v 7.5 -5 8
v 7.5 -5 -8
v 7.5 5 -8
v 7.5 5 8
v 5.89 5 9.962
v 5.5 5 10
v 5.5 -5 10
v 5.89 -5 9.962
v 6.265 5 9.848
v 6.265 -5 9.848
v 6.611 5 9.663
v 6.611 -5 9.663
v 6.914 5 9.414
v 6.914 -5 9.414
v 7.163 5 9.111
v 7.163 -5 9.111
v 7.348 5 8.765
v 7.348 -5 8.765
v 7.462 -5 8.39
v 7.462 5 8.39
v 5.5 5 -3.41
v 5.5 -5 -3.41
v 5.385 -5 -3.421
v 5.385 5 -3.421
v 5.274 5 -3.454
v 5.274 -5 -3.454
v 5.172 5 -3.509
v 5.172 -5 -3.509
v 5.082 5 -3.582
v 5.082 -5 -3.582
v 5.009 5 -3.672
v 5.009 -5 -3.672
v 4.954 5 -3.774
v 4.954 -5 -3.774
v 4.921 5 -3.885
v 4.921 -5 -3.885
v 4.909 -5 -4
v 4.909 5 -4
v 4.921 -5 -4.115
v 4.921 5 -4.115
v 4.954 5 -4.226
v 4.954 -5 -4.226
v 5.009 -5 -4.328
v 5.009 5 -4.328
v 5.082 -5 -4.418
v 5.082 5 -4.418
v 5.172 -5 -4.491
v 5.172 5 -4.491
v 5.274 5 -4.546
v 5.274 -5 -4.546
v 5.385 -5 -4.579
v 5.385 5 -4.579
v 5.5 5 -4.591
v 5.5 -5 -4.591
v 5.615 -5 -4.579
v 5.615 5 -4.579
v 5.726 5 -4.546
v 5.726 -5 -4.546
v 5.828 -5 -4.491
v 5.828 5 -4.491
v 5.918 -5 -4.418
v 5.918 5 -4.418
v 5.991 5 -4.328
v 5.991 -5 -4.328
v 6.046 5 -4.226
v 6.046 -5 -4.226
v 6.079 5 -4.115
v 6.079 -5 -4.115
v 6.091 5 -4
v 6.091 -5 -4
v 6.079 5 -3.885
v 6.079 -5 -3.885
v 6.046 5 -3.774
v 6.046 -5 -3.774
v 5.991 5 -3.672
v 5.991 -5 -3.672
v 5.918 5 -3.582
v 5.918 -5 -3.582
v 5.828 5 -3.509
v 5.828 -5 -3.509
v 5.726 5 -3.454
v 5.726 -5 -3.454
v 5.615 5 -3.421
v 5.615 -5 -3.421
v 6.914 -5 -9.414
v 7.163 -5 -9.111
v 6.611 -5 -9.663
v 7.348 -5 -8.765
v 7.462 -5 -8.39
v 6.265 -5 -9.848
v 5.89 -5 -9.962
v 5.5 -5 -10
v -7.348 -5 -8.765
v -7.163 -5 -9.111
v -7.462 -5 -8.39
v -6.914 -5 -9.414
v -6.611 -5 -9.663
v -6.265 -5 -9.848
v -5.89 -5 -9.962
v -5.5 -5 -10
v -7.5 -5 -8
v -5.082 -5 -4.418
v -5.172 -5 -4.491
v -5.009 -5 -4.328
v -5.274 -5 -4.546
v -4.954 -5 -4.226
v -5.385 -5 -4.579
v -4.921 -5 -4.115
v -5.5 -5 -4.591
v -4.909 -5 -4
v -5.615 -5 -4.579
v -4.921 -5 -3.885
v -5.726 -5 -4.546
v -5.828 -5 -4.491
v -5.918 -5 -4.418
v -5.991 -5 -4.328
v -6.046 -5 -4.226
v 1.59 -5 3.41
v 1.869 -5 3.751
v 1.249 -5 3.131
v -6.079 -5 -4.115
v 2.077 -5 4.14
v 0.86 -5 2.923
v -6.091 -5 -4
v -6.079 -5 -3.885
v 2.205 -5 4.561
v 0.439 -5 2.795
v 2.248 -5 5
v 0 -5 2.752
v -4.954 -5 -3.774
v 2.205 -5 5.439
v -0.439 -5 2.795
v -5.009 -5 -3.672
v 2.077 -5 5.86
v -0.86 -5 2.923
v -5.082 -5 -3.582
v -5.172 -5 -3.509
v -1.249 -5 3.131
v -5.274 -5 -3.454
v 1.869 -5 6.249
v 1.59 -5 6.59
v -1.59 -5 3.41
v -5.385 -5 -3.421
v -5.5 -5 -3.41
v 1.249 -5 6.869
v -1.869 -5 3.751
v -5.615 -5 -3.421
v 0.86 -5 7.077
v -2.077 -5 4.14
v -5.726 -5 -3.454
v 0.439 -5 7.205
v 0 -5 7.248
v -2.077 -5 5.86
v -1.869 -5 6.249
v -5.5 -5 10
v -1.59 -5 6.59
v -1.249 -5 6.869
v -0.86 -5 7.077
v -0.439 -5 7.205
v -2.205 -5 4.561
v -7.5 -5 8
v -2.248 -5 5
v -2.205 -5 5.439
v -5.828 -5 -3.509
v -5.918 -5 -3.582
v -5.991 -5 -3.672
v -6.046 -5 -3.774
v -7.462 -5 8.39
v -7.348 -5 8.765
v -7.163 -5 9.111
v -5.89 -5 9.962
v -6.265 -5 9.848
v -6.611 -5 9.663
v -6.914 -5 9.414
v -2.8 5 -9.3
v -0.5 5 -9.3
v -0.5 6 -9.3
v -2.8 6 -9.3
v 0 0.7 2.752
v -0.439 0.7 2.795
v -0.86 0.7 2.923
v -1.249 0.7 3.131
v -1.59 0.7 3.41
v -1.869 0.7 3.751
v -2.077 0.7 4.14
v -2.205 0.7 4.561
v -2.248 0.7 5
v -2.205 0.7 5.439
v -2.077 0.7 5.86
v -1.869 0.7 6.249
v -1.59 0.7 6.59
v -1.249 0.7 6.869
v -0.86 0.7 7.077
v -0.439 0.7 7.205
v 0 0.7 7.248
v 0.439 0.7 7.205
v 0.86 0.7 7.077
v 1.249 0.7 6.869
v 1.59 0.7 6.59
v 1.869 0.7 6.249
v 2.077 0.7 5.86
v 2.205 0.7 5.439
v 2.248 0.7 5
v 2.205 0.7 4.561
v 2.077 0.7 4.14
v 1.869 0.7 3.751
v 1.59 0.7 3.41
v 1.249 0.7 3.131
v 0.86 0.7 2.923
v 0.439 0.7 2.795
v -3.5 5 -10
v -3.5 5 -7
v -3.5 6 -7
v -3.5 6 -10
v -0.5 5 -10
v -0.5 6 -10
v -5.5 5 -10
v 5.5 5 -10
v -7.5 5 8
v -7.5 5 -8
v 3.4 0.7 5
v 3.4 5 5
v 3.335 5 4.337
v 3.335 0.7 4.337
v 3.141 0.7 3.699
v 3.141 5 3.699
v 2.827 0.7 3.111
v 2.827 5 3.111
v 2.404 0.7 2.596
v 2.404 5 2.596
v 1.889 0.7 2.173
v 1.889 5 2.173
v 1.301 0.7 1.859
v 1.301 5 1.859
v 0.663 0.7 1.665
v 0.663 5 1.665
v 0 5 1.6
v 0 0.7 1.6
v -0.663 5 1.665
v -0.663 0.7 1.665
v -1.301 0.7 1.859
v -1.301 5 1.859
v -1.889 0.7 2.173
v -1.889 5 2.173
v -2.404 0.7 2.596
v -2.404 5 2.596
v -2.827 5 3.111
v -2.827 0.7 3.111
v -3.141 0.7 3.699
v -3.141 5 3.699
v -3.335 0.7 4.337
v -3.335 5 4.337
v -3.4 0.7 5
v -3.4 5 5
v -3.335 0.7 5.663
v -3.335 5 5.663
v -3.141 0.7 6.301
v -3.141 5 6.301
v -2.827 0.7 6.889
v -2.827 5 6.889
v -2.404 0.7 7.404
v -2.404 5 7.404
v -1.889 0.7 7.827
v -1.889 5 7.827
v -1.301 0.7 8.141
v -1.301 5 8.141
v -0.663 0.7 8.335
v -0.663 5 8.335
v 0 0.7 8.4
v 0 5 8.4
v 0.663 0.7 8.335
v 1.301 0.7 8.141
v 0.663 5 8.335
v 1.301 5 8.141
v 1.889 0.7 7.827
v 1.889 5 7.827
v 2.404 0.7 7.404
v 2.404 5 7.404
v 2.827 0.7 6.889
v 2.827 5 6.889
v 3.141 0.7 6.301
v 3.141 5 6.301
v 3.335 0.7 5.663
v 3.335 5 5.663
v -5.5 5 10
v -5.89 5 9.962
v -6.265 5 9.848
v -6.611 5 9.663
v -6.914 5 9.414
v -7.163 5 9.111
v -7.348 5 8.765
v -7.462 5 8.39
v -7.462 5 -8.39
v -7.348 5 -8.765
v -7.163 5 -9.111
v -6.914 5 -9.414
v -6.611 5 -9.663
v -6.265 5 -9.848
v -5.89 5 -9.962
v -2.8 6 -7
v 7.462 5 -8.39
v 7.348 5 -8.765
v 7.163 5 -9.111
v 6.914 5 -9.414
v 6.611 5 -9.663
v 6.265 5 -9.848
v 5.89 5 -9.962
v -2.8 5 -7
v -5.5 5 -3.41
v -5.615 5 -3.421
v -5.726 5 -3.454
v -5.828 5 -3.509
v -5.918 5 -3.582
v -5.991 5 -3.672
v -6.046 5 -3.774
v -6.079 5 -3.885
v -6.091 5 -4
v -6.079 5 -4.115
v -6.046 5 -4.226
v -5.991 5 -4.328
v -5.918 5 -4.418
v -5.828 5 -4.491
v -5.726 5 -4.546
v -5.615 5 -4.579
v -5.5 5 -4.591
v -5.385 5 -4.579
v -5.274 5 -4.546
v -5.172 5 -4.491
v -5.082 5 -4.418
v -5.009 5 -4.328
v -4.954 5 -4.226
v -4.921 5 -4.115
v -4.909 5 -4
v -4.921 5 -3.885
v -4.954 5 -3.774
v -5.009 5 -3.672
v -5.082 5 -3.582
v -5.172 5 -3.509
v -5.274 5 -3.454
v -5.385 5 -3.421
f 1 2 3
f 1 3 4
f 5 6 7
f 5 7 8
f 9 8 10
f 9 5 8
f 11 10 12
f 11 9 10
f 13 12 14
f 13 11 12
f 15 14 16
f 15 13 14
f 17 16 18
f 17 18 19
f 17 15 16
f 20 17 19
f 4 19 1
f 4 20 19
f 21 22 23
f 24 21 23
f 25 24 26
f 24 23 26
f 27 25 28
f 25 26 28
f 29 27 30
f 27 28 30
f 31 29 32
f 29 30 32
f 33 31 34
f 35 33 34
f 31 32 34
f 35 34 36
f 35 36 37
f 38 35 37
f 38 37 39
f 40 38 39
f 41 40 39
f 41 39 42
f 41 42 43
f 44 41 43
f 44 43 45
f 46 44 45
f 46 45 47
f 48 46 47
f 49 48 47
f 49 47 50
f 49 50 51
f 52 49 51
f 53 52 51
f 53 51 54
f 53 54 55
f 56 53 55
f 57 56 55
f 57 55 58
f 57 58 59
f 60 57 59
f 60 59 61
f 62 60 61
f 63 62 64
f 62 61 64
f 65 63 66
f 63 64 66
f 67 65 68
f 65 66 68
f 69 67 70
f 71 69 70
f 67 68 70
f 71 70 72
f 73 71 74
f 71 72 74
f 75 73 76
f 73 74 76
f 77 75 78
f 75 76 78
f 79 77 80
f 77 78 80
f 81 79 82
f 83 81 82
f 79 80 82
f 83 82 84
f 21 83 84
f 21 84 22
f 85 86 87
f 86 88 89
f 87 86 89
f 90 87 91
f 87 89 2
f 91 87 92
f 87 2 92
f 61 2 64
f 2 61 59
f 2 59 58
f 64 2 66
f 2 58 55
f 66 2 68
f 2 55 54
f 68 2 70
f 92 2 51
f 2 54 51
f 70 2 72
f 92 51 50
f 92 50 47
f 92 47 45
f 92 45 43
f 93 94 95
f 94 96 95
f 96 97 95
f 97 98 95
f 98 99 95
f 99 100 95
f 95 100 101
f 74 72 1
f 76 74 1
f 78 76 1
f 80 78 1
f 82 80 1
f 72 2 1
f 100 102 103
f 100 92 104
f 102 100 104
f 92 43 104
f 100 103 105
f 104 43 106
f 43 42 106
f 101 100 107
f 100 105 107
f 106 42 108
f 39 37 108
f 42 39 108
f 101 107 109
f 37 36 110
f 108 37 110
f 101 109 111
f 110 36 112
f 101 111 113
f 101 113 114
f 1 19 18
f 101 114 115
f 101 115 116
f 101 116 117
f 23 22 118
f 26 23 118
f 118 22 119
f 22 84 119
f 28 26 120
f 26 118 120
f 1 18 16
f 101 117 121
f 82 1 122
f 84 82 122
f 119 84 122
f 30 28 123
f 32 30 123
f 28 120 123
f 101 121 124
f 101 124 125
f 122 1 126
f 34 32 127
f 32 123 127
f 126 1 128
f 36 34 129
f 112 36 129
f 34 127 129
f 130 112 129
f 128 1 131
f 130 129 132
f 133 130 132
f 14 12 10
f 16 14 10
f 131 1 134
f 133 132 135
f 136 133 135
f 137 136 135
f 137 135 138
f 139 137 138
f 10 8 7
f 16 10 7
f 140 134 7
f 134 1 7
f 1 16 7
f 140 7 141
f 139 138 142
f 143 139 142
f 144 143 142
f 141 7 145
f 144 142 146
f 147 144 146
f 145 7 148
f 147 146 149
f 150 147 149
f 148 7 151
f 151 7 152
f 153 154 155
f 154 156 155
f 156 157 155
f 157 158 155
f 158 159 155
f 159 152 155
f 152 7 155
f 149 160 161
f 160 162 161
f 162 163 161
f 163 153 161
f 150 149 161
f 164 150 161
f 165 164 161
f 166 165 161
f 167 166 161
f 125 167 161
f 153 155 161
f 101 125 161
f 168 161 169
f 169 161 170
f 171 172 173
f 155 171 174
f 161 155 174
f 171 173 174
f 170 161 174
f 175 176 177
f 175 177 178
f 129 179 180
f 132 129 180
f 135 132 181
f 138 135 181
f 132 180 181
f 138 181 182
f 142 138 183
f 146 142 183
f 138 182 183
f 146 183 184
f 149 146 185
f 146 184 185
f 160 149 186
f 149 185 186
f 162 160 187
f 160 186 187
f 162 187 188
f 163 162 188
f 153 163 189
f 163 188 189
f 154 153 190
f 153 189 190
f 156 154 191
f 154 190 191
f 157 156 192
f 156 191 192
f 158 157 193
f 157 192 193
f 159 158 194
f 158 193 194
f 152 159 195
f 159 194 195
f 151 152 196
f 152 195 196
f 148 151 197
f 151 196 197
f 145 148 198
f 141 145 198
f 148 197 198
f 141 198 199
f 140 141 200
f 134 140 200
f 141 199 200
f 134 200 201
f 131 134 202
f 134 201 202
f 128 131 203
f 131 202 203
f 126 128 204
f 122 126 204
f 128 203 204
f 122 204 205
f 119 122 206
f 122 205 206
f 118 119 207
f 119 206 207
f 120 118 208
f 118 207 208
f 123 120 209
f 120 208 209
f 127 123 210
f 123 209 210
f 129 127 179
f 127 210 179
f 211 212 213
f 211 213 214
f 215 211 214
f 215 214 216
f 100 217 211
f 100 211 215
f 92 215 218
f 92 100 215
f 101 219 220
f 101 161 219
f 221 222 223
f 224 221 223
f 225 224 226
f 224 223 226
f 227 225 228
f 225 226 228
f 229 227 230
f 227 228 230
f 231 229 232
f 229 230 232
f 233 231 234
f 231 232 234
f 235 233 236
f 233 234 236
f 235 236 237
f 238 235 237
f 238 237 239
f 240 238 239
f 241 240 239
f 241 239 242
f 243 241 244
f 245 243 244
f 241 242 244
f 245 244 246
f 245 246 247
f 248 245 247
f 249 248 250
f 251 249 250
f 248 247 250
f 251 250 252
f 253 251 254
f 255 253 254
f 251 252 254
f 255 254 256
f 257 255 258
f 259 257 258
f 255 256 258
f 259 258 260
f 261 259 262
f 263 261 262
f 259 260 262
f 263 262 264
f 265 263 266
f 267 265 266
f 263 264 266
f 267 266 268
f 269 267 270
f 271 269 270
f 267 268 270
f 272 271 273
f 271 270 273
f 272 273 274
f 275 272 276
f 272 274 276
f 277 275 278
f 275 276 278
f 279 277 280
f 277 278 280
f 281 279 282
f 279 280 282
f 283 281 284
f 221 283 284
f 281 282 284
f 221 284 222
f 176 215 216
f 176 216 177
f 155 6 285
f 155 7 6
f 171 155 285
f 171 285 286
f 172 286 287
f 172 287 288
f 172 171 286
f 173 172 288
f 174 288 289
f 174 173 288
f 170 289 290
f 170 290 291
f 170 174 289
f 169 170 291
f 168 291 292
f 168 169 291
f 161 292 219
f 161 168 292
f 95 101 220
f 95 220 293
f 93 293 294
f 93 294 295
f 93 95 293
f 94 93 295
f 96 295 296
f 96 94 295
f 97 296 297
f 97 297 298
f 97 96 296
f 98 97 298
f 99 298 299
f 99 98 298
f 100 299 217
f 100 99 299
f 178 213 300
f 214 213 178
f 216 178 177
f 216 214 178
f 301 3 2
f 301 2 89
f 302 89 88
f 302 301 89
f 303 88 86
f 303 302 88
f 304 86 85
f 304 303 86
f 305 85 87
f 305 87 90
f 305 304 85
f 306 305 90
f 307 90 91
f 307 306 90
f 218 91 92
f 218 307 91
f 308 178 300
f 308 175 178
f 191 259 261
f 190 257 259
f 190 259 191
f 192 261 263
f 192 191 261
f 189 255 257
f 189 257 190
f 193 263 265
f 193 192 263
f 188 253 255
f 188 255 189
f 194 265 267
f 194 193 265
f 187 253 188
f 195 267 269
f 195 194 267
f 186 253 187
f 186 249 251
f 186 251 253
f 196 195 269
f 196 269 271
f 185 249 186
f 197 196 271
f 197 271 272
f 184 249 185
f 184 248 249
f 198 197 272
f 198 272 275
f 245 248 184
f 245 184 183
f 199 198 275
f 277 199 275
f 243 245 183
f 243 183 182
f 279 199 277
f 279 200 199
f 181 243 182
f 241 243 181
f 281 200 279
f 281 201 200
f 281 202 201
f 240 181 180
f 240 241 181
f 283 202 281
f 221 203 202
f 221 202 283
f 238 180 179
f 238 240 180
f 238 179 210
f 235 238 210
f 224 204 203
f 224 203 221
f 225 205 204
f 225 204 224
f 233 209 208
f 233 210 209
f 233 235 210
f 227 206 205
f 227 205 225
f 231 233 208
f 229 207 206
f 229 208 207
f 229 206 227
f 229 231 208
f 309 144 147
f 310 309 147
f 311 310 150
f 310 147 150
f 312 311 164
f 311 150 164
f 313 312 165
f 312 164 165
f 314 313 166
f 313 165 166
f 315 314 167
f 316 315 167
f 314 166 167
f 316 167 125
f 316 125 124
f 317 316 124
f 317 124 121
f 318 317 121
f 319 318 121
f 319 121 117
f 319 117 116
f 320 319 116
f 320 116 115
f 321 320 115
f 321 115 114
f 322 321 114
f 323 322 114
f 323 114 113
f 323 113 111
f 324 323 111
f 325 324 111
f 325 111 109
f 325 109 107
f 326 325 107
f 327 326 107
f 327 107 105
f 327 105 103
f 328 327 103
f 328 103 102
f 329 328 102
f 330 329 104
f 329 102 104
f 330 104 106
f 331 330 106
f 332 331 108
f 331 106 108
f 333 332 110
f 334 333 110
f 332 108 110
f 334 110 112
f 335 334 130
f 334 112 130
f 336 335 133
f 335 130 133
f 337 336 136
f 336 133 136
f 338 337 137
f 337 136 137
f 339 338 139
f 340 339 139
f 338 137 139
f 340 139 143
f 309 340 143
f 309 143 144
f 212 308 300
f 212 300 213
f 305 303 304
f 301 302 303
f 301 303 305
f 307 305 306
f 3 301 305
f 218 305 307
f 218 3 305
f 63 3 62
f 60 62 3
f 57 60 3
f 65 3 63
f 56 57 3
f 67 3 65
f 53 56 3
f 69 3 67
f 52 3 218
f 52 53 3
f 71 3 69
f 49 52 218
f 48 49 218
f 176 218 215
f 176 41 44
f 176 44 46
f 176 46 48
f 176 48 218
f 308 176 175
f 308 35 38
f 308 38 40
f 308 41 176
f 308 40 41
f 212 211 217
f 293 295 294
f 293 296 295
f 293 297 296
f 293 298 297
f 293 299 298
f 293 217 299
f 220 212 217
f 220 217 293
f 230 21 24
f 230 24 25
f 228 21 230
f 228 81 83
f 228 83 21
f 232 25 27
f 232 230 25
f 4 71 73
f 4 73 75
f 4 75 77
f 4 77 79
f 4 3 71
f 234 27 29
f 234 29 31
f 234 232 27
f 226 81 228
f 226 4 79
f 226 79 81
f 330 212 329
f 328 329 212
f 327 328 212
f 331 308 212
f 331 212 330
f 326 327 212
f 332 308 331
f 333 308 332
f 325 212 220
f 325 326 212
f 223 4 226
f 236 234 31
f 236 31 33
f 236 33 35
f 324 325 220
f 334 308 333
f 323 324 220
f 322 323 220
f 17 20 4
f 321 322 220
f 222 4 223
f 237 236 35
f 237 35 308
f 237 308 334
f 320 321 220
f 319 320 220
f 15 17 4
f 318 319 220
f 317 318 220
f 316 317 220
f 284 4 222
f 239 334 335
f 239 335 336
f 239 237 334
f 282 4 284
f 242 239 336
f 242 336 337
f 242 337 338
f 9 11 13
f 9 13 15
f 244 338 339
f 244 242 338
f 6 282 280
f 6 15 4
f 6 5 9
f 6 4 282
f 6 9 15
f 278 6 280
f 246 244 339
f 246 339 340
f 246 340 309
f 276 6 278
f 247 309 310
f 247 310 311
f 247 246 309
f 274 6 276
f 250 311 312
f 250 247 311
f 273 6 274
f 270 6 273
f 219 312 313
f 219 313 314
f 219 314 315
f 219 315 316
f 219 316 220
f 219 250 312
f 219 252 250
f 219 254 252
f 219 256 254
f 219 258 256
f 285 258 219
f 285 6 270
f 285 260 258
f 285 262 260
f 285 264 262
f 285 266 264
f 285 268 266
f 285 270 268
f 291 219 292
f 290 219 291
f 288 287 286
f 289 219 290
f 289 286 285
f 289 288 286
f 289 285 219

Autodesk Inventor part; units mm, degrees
ref_plane "YZ Plane" through (0, 0, 0) normal (1, 0, 0) x (0, 1, 0)
ref_plane "XZ Plane" through (0, 0, 0) normal (0, 1, 0) x (-1, 0, 0)
ref_plane "XY Plane" through (0, 0, 0) normal (0, 0, 1) x (1, 0, 0)
sketch "Sketch1" plane through (0, 0, 0) normal (0, 1, 0) x (-1, 0, 0)
  line L0 (-7.5, 10) -> (7.5, 10)
  line L1 (7.5, 10) -> (7.5, -10)
  line L2 (7.5, -10) -> (-7.5, -10)
  line L3 (-7.5, -10) -> (-7.5, 10)
  line L4 (-7.5, 10) -> (7.5, -10) construction
  line L5 (7.5, 10) -> (-7.5, -10) construction
  point P0 (0, 0)
  dimension "d0" = 15
  dimension "d1" = 20
extrude "Extrusion1" add sketch "Sketch1" along normal mid plane 10
sketch "Sketch2" plane through (0, 5, 0) normal (0, 1, 0) x (1, 0, 0)
  line L0 (-3.5, 7) -> (-3.5, 10)
  line L1 (-3.5, 10) -> (-0.5, 10)
  line L2 (-0.5, 10) -> (-0.5, 9.3)
  line L3 (-0.5, 9.3) -> (-2.8, 9.3)
  line L4 (-2.8, 9.3) -> (-2.8, 7)
  line L5 (-2.8, 7) -> (-3.5, 7)
  line L6 (7.5, 10) -> (-7.5, 10) projected
  line L7 (-7.5, 10) -> (-7.5, -10) projected
  point P0 (0, 0)
  dimension "d4" = 3
  dimension "d5" = 0.7
  dimension "d7" = 4
extrude "Extrusion2" add sketch "Sketch2" along normal blind 1
fillet "Fillet1" radius 2 4 edges at (-7.5, 0, -10) (-7.5, 0, 10) (7.5, 0, 10) (7.5, 0, -10)
sketch "Sketch4" plane through (0, 5, 0) normal (0, 1, 0) x (1, 0, 0)
  line L0 (7.5, -8) -> (7.5, 8) projected
  line L1 (5.5, 10) -> (-0.5, 10) projected
  line L2 (-7.5, 8) -> (-7.5, -8) projected
  point P0 (0, 0)
  point P1 (5.5, 4)
  point P2 (-5.5, 4)
  dimension "d19" = 2
  dimension "d29" = 6
  dimension "d49" = 2
hole "Hole2" at (5.5, 5, -4) at (-5.5, 5, -4) direction (0, -1, 0) diameter 1.181 end through all thread size "0-80 UNF" class "2B" standard "ANSI Unified Screw Threads"
sketch "Sketch6" plane through (0, -5, 0) normal (0, -1, 0) x (1, 0, 0)
  line L0 (5.5, 10) -> (-5.5, 10) projected
  point P0 (0, 0)
  point P1 (0, 5)
  dimension "d38" = 5
hole "Hole4" at (0, -5, 5) direction (0, 1, 0) diameter 4.496 end through all clearance for "Flat Head Machine Screw (82)" size "#8" standard "Ansi Unified Screw Threads"
sketch "Sketch7" plane through (0, 5, 0) normal (0, 1, 0) x (1, 0, 0)
  circle A0 centre (0, -5) radius 2.248 projected
  circle A1 centre (0, -5) radius 3.4
  point P0 (0, 0)
  dimension "d46" = 6.8
extrude "Extrusion3" cut sketch "Sketch7" against normal blind 4.3
equation "\"d49\" = d19"
properties part number "ChipHolder"
